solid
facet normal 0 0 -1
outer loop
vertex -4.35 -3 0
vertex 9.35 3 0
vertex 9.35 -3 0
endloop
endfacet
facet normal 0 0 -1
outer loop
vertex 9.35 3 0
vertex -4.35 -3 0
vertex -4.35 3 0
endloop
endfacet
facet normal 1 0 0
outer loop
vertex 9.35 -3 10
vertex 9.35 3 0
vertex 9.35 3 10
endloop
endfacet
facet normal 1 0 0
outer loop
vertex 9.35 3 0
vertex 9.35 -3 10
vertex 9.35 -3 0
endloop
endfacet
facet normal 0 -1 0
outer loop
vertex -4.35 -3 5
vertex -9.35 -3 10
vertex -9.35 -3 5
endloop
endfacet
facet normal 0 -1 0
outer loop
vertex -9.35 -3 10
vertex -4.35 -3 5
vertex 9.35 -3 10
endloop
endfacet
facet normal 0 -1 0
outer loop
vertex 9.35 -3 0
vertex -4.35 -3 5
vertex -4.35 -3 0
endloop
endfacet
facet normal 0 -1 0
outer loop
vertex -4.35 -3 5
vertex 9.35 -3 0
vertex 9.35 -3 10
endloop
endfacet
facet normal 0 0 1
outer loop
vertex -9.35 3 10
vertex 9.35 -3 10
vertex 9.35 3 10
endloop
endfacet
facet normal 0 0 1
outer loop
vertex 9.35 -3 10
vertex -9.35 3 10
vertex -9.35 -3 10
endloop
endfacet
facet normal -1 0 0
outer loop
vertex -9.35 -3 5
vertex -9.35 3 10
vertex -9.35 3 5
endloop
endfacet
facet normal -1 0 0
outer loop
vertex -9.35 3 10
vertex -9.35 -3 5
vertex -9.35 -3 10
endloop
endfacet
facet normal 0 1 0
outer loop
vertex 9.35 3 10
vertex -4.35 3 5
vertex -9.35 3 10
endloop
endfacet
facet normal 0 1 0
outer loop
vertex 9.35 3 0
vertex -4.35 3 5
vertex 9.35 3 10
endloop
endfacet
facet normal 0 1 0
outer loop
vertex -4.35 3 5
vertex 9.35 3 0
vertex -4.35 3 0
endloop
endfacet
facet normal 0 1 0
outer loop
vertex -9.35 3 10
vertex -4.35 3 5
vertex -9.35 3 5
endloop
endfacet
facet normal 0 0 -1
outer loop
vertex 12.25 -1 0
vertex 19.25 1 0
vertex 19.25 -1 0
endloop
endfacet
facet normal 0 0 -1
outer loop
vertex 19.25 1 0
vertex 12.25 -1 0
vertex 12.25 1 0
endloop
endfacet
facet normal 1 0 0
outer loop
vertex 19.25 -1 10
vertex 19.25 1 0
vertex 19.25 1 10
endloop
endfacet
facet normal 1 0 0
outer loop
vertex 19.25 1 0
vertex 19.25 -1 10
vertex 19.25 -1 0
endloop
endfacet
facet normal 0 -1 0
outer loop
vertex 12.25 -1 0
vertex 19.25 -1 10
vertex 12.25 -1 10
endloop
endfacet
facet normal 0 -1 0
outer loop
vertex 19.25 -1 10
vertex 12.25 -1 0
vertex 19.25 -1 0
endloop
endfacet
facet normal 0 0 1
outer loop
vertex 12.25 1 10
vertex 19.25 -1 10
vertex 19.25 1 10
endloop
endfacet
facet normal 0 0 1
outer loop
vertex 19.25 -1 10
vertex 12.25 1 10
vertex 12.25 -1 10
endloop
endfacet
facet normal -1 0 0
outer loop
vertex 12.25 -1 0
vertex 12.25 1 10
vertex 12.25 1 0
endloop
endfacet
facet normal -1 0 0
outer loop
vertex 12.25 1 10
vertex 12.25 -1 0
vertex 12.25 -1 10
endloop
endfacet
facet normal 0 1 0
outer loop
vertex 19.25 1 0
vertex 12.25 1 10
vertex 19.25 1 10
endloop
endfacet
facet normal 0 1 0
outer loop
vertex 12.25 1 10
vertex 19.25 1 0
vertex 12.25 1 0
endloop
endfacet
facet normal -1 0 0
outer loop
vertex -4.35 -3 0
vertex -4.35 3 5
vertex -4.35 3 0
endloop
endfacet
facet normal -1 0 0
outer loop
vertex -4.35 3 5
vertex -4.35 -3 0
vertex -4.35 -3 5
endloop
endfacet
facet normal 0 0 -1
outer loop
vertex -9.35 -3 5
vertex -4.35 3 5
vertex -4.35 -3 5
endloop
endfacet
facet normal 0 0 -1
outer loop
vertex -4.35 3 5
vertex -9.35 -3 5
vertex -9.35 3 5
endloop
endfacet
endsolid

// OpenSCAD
// Built by bench/smallmodels/features/compiler.py from a list of features.
$fn = 64;
difference() {
  union() {
    translate([0, 0, 0]) linear_extrude(height = 10) polygon([[-9.35, -3], [9.35, -3], [9.35, 3], [-9.35, 3]]);
    translate([15, 0, 0]) linear_extrude(height = 10) polygon([[-2.75, -1], [4.25, -1], [4.25, 1], [-2.75, 1]]);
  }
  union() {
    translate([-9.35, 0, -5]) rotate([0, 0, 0]) translate([-5, -5, 0]) cube([10, 10, 10]);
  }
}
difference() {
  union() {
    translate([15, 0, 0]) linear_extrude(height = 10) polygon([[-2.75, -1], [4.25, -1], [4.25, 1], [-2.75, 1]]);
  }
  union() {
    translate([19.25, 0, -2.25]) rotate([0, 0, 0]) translate([-2.25, -2.5, 0]) cube([4.5, 5, 10]);
  }
}
